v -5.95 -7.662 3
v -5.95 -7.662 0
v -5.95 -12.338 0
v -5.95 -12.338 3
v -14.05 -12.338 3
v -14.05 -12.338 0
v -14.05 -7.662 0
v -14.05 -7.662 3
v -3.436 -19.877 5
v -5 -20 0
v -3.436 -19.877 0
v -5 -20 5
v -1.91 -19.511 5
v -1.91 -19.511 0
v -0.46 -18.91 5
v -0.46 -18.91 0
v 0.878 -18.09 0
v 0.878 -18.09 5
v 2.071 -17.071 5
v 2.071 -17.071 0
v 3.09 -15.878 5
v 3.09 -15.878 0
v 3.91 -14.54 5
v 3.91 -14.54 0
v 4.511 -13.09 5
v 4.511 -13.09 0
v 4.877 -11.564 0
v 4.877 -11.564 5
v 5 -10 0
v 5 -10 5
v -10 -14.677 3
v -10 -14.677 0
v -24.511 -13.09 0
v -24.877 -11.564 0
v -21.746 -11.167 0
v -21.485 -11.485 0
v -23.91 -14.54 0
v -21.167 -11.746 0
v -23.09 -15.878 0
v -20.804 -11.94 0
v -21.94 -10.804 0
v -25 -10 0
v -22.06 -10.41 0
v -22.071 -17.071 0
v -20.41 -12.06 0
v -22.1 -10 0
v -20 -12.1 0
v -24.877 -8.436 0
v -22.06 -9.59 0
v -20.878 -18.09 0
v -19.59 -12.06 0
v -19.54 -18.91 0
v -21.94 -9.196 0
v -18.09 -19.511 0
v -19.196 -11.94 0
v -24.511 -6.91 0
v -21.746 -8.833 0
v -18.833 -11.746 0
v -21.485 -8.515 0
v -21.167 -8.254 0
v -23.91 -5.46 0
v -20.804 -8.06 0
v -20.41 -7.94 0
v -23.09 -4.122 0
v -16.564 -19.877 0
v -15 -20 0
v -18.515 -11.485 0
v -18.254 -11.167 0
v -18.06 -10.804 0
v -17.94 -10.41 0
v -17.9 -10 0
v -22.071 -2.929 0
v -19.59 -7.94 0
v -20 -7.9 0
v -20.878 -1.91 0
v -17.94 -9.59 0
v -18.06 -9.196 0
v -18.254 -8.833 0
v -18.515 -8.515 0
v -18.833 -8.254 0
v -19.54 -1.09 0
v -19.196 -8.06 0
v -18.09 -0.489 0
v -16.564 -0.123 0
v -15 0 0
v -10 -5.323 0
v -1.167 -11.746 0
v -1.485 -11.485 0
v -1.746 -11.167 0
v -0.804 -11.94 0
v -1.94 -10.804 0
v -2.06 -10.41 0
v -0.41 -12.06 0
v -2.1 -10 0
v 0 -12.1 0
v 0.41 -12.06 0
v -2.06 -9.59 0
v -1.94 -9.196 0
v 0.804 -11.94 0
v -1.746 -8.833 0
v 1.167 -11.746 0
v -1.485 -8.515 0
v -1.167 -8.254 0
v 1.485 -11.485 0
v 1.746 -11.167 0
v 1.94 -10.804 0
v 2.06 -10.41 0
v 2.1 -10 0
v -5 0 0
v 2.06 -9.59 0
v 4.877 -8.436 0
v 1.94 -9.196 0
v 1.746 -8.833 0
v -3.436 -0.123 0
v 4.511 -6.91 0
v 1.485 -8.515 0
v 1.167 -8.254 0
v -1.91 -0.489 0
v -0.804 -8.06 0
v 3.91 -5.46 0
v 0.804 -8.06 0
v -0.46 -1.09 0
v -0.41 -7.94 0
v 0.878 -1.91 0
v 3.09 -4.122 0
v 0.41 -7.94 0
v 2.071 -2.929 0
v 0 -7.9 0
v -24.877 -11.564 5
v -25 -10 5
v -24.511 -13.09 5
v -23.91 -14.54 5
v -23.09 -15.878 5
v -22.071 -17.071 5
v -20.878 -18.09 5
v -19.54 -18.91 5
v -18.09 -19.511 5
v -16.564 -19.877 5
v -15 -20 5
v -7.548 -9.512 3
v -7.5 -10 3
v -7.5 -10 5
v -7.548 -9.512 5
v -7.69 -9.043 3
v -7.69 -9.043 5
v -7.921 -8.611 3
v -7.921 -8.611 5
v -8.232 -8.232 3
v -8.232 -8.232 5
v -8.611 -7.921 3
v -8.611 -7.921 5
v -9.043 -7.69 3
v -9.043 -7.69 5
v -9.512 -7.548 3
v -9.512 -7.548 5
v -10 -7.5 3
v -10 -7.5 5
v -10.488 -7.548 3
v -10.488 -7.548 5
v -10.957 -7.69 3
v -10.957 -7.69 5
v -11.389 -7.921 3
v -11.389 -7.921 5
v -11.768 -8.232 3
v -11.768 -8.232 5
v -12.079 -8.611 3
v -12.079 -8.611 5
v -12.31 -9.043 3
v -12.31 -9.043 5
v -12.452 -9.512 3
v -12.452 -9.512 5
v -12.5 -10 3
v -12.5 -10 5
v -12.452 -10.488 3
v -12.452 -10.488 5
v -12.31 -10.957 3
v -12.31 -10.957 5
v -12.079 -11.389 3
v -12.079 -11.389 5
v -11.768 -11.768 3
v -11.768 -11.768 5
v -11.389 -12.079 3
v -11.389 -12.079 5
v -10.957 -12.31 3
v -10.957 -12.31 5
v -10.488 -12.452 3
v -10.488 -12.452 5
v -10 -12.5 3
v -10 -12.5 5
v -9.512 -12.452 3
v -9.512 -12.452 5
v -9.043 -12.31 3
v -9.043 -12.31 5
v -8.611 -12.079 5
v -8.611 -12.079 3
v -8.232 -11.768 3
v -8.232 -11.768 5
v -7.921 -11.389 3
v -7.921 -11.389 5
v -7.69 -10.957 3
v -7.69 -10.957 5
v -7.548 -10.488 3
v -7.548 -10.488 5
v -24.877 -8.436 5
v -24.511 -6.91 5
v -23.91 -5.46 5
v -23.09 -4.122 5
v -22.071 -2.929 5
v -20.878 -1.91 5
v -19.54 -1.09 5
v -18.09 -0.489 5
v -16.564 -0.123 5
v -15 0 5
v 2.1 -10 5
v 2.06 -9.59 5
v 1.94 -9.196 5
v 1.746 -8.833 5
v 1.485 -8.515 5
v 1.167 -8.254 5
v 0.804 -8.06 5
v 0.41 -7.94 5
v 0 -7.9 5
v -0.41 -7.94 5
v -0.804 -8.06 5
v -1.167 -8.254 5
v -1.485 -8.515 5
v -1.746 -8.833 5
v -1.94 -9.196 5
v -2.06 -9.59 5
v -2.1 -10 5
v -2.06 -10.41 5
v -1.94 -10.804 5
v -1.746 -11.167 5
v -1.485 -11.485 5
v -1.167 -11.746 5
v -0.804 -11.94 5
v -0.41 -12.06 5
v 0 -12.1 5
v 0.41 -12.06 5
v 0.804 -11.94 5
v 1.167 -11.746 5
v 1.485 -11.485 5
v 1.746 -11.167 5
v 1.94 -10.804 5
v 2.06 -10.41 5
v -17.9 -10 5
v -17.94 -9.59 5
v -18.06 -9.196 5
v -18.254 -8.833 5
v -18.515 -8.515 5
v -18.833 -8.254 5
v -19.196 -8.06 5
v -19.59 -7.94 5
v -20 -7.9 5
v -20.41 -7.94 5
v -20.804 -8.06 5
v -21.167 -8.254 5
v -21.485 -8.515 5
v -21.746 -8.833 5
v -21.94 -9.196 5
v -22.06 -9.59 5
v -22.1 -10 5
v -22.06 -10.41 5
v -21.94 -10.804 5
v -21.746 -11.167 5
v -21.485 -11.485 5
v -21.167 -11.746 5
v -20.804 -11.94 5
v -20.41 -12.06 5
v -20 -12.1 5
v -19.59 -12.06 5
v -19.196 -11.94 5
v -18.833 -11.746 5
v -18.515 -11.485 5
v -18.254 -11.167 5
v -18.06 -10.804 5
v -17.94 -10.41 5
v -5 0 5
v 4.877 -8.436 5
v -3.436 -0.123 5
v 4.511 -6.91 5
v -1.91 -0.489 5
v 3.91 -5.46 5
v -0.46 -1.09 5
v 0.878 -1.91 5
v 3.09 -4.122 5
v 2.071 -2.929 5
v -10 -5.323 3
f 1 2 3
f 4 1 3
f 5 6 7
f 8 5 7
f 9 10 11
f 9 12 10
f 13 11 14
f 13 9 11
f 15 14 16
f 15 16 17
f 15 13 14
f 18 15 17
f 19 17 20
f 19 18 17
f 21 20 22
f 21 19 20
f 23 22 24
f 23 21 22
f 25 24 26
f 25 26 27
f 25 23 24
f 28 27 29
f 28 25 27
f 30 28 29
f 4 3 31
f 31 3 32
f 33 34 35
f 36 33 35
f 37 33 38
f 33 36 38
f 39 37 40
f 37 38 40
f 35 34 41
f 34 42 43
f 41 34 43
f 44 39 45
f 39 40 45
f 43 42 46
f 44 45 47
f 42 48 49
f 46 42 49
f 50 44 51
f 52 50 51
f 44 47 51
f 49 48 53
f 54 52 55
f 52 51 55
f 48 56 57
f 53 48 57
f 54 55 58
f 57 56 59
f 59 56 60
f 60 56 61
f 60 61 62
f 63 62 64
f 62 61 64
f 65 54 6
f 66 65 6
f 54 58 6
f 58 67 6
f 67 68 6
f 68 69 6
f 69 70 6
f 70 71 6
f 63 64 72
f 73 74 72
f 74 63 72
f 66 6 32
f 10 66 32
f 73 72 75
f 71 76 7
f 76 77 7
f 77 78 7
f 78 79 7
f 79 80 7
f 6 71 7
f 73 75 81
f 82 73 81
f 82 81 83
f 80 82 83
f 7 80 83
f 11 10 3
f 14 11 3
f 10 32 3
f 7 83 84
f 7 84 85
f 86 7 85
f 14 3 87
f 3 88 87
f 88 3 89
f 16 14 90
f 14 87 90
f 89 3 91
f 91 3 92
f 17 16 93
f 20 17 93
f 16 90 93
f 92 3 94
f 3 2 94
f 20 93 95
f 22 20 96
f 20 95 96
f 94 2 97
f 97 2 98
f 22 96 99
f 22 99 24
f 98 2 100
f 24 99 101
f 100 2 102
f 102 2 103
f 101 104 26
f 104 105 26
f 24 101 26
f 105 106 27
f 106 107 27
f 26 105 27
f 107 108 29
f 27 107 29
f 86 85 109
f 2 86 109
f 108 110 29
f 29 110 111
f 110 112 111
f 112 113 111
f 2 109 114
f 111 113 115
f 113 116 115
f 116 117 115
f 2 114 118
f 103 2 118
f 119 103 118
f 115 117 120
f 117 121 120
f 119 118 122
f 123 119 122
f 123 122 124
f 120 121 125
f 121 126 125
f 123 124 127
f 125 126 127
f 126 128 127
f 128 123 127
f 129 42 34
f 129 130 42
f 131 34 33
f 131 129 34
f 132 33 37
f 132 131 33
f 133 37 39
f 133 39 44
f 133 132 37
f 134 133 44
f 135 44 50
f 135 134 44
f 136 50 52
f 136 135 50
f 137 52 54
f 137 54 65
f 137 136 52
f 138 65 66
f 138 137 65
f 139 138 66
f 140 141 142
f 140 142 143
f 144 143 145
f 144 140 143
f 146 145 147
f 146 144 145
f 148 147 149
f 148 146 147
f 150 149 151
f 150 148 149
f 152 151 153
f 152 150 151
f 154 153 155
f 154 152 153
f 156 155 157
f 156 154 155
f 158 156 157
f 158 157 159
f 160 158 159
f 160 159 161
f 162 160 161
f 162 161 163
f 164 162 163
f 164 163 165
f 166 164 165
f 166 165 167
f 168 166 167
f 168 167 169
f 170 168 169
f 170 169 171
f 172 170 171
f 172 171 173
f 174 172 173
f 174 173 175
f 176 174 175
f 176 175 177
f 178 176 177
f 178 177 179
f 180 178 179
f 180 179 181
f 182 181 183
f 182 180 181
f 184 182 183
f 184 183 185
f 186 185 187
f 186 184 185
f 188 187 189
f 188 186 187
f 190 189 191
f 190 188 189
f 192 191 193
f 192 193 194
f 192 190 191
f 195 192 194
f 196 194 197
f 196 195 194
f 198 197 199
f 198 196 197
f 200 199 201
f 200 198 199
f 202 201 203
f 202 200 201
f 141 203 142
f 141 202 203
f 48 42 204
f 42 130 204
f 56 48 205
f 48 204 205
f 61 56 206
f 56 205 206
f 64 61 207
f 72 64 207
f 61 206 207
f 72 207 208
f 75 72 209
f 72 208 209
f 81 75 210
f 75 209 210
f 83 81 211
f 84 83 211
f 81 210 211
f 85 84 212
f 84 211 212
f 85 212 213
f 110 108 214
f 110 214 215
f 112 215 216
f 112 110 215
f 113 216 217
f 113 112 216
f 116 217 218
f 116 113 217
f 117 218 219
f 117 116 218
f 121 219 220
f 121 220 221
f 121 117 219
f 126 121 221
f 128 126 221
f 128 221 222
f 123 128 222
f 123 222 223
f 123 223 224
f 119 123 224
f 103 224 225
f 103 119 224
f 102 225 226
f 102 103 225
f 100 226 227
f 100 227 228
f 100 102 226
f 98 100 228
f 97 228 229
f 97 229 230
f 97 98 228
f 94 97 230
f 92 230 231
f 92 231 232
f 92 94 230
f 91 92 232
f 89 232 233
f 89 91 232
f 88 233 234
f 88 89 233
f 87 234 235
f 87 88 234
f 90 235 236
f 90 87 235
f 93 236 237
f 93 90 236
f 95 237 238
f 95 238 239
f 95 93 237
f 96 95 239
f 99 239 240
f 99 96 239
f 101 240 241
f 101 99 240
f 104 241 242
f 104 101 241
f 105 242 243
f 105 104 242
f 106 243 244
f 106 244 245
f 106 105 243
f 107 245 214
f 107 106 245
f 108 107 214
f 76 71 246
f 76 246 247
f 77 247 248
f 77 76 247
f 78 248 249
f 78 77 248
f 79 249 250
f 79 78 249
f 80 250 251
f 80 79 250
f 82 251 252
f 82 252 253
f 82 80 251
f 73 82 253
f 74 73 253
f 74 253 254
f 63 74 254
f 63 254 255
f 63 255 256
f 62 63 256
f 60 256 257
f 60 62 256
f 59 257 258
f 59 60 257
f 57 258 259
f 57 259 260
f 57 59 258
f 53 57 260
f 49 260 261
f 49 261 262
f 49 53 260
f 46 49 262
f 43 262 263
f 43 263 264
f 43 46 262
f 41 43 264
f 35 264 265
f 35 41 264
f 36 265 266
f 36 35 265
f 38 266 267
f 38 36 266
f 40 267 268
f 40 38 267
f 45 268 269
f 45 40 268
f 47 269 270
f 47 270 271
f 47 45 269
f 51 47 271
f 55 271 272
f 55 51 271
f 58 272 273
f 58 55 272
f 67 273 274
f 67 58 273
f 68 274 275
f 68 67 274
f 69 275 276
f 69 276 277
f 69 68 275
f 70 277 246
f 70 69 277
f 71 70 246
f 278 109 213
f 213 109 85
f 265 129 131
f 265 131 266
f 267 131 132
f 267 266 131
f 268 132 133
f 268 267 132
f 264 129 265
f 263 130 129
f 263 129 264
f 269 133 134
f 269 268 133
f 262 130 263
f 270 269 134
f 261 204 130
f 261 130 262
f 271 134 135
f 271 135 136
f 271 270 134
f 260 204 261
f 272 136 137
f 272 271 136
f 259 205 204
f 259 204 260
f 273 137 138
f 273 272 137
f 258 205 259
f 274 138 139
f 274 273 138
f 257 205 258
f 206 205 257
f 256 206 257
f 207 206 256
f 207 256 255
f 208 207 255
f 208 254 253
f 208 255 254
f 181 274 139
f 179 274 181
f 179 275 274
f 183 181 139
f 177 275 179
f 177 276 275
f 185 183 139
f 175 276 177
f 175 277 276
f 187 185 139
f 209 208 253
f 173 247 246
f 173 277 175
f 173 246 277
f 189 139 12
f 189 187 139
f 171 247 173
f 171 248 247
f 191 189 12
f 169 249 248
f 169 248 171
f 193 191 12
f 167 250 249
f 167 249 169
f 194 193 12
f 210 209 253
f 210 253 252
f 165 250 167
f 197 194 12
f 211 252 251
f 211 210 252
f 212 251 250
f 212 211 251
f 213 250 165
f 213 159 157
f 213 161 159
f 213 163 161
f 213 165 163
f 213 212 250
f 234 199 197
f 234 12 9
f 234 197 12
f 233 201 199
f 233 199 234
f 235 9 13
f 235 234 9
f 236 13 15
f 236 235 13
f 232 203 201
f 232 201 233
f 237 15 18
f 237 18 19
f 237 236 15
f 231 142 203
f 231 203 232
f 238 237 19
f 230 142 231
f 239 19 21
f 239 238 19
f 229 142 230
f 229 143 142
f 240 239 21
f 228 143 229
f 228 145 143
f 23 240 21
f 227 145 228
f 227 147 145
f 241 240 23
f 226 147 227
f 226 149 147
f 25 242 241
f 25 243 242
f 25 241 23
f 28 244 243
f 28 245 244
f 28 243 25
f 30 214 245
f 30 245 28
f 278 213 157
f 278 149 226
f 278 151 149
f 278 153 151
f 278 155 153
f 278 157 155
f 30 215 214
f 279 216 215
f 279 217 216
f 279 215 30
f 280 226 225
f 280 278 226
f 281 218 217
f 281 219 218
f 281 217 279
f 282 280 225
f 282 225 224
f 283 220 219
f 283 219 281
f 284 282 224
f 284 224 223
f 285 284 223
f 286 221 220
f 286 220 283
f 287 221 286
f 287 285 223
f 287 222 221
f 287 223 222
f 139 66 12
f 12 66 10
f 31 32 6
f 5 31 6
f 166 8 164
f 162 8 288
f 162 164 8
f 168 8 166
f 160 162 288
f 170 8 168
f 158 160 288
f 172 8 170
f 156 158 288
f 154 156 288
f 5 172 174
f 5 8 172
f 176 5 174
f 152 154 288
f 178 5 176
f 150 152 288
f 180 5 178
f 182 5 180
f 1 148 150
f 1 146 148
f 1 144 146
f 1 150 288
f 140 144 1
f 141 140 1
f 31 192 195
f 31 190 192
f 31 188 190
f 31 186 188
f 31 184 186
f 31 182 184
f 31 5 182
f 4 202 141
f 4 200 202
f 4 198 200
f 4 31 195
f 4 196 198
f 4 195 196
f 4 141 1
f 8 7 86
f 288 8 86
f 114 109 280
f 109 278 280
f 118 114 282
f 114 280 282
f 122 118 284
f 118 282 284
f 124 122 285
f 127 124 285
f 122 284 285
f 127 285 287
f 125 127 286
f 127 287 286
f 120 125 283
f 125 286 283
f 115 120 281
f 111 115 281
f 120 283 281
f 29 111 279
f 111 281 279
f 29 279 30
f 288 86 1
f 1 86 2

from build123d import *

# Parameters (mm, degrees)
F0_R     = 2.1
F0_R_2   = 2.5
F1_DEPTH = 5
F2_R     = 9.99999
F3_R     = 2.5
F4_DEPTH = 3


# Not quite as in the source:
# - a fillet or chamfer is up to 0.001 mm smaller than in the source, because OpenCascade refuses the exact size


with BuildPart() as f1:
    # F0 (on Top) → F1 (new body)
    with BuildSketch(Plane.XY):
        Polygon((0, 0), (-20, 0), (-25, 0), (-25, -20), (-20, -20), (0, -20), (5, -20), (5, 0), align=None)
        with Locations((-20, -10)):
            Circle(F0_R, mode=Mode.SUBTRACT)
        with Locations((-10, -10)):
            Circle(F0_R_2, mode=Mode.SUBTRACT)
        with Locations((0, -10)):
            Circle(F0_R, mode=Mode.SUBTRACT)
    extrude(amount=F1_DEPTH)

    # F2 (radius 10 in the source; OpenCascade refuses exactly that, so slightly less here)
    f2_edges = [f1.edges().sort_by_distance(p)[0] for p in [
        (-25, -20, 2.5),
        (5, -20, 2.5),
        (5, 0, 2.5),
        (-25, 0, 2.5),
    ]]
    fillet(f2_edges, radius=F2_R)

    # F3 (on face) → F4 (cut)
    with BuildSketch(Plane(origin=(0, 0, 0), x_dir=(1, 0, 0), z_dir=(0, 0, -1))):
        Polygon((-14.05, 12.3382685902), (-14.05, 7.6617314098), (-10, 5.3234628196), (-5.95, 7.6617314098), (-5.95, 12.3382685902), (-10, 14.6765371804), align=None)
        with Locations((-10, 10)):
            Circle(F3_R, mode=Mode.SUBTRACT)
        with Locations((-10, 10)):
            Circle(F3_R)
    extrude(amount=-F4_DEPTH, mode=Mode.SUBTRACT)


solid = f1.part
